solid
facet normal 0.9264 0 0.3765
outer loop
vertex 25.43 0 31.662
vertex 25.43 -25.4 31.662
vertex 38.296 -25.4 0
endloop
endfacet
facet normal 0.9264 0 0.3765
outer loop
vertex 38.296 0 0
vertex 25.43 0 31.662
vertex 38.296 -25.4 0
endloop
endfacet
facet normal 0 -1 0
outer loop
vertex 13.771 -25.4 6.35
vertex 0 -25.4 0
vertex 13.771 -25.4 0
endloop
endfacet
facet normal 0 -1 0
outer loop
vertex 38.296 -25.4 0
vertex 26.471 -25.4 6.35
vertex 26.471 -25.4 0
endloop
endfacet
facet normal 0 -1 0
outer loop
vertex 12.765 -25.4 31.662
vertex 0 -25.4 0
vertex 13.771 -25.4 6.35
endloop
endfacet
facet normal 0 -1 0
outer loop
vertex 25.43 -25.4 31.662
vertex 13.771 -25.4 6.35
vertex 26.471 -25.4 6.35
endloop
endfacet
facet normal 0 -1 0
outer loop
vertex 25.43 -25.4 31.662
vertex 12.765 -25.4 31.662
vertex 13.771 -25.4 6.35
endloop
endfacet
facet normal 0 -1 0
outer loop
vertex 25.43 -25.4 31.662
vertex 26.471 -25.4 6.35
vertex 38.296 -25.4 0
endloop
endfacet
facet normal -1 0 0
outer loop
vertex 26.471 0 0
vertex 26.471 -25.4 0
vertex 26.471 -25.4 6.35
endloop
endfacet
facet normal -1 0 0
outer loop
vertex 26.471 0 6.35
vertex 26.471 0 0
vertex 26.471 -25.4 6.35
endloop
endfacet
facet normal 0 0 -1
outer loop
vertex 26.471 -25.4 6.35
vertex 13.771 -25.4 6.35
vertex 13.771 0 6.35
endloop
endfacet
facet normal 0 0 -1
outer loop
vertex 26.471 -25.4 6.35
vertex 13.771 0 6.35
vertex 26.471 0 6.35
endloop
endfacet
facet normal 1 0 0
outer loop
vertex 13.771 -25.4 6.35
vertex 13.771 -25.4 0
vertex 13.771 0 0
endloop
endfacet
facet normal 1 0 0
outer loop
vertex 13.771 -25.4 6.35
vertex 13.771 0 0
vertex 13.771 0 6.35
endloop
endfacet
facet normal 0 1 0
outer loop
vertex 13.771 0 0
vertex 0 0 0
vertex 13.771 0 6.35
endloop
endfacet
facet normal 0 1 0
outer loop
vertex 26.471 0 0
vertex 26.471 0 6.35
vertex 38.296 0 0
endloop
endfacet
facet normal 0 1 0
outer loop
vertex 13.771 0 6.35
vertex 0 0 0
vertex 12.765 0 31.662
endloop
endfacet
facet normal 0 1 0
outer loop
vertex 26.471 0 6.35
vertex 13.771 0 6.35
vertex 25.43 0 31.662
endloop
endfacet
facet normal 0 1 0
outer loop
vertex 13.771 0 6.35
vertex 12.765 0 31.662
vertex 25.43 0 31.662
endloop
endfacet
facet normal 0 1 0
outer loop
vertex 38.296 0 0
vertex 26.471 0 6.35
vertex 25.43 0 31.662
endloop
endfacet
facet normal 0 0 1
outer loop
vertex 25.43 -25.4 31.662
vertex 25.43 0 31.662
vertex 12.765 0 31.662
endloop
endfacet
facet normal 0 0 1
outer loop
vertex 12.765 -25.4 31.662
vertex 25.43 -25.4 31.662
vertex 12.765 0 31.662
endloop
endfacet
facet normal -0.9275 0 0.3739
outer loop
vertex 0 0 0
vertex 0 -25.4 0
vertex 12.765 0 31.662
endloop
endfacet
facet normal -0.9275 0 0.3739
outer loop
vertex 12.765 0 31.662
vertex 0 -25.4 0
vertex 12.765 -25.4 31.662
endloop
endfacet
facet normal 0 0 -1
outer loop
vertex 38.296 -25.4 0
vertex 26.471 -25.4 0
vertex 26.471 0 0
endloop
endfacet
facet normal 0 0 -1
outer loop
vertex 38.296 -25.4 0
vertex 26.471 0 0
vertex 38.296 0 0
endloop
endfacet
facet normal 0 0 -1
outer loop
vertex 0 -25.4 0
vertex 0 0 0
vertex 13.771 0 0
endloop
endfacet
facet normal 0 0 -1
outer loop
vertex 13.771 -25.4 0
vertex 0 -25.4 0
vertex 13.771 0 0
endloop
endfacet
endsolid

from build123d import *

# Parameters (mm, degrees)
F0_W     = 38.2962413132
F0_H     = 31.662248075
F1_DEPTH = 25.4
F3_DEPTH = 25.401
F5_DEPTH = 25.4
F6_DEPTH = 50.801
F7_W     = 12.7
F7_H     = 6.35
F8_DEPTH = 25.4


with BuildPart() as f1:
    # F0 (on Front) → F1 (new body)
    with BuildSketch(Plane.XZ):
        with Locations((19.1481206566, 15.8311240375)):
            Rectangle(F0_W, F0_H)
    extrude(amount=F1_DEPTH)

    # F2 (on face) → F3 (cut, through all)
    with BuildSketch(Plane.XZ.offset(25.4)):
        Polygon((0, 31.662248075), (0, 0), (12.7654150128, 31.662248075), align=None)
    extrude(amount=-F3_DEPTH, mode=Mode.SUBTRACT)

    # F4 (on face) → F5 (join)
    with BuildSketch(Plane.XZ.offset(25.4)):
        Polygon((25.4303161055, 31.662248075), (38.2962413132, 0), (38.2962413132, 31.662248075), align=None)
    extrude(amount=F5_DEPTH)

    # F6 (cut, through all): a face of the model
    f6_faces = [f1.faces().sort_by_distance(p)[0] for p in [
        (34.0075995773, -50.8, 21.1081653833),
    ]]
    extrude(f6_faces, amount=-F6_DEPTH, mode=Mode.SUBTRACT)

    # F7 (on face) → F8 (cut)
    with BuildSketch(Plane.XZ.offset(25.4)):
        with Locations((20.1205644593, 3.175)):
            Rectangle(F7_W, F7_H)
    extrude(amount=-F8_DEPTH, mode=Mode.SUBTRACT)


solid = f1.part
